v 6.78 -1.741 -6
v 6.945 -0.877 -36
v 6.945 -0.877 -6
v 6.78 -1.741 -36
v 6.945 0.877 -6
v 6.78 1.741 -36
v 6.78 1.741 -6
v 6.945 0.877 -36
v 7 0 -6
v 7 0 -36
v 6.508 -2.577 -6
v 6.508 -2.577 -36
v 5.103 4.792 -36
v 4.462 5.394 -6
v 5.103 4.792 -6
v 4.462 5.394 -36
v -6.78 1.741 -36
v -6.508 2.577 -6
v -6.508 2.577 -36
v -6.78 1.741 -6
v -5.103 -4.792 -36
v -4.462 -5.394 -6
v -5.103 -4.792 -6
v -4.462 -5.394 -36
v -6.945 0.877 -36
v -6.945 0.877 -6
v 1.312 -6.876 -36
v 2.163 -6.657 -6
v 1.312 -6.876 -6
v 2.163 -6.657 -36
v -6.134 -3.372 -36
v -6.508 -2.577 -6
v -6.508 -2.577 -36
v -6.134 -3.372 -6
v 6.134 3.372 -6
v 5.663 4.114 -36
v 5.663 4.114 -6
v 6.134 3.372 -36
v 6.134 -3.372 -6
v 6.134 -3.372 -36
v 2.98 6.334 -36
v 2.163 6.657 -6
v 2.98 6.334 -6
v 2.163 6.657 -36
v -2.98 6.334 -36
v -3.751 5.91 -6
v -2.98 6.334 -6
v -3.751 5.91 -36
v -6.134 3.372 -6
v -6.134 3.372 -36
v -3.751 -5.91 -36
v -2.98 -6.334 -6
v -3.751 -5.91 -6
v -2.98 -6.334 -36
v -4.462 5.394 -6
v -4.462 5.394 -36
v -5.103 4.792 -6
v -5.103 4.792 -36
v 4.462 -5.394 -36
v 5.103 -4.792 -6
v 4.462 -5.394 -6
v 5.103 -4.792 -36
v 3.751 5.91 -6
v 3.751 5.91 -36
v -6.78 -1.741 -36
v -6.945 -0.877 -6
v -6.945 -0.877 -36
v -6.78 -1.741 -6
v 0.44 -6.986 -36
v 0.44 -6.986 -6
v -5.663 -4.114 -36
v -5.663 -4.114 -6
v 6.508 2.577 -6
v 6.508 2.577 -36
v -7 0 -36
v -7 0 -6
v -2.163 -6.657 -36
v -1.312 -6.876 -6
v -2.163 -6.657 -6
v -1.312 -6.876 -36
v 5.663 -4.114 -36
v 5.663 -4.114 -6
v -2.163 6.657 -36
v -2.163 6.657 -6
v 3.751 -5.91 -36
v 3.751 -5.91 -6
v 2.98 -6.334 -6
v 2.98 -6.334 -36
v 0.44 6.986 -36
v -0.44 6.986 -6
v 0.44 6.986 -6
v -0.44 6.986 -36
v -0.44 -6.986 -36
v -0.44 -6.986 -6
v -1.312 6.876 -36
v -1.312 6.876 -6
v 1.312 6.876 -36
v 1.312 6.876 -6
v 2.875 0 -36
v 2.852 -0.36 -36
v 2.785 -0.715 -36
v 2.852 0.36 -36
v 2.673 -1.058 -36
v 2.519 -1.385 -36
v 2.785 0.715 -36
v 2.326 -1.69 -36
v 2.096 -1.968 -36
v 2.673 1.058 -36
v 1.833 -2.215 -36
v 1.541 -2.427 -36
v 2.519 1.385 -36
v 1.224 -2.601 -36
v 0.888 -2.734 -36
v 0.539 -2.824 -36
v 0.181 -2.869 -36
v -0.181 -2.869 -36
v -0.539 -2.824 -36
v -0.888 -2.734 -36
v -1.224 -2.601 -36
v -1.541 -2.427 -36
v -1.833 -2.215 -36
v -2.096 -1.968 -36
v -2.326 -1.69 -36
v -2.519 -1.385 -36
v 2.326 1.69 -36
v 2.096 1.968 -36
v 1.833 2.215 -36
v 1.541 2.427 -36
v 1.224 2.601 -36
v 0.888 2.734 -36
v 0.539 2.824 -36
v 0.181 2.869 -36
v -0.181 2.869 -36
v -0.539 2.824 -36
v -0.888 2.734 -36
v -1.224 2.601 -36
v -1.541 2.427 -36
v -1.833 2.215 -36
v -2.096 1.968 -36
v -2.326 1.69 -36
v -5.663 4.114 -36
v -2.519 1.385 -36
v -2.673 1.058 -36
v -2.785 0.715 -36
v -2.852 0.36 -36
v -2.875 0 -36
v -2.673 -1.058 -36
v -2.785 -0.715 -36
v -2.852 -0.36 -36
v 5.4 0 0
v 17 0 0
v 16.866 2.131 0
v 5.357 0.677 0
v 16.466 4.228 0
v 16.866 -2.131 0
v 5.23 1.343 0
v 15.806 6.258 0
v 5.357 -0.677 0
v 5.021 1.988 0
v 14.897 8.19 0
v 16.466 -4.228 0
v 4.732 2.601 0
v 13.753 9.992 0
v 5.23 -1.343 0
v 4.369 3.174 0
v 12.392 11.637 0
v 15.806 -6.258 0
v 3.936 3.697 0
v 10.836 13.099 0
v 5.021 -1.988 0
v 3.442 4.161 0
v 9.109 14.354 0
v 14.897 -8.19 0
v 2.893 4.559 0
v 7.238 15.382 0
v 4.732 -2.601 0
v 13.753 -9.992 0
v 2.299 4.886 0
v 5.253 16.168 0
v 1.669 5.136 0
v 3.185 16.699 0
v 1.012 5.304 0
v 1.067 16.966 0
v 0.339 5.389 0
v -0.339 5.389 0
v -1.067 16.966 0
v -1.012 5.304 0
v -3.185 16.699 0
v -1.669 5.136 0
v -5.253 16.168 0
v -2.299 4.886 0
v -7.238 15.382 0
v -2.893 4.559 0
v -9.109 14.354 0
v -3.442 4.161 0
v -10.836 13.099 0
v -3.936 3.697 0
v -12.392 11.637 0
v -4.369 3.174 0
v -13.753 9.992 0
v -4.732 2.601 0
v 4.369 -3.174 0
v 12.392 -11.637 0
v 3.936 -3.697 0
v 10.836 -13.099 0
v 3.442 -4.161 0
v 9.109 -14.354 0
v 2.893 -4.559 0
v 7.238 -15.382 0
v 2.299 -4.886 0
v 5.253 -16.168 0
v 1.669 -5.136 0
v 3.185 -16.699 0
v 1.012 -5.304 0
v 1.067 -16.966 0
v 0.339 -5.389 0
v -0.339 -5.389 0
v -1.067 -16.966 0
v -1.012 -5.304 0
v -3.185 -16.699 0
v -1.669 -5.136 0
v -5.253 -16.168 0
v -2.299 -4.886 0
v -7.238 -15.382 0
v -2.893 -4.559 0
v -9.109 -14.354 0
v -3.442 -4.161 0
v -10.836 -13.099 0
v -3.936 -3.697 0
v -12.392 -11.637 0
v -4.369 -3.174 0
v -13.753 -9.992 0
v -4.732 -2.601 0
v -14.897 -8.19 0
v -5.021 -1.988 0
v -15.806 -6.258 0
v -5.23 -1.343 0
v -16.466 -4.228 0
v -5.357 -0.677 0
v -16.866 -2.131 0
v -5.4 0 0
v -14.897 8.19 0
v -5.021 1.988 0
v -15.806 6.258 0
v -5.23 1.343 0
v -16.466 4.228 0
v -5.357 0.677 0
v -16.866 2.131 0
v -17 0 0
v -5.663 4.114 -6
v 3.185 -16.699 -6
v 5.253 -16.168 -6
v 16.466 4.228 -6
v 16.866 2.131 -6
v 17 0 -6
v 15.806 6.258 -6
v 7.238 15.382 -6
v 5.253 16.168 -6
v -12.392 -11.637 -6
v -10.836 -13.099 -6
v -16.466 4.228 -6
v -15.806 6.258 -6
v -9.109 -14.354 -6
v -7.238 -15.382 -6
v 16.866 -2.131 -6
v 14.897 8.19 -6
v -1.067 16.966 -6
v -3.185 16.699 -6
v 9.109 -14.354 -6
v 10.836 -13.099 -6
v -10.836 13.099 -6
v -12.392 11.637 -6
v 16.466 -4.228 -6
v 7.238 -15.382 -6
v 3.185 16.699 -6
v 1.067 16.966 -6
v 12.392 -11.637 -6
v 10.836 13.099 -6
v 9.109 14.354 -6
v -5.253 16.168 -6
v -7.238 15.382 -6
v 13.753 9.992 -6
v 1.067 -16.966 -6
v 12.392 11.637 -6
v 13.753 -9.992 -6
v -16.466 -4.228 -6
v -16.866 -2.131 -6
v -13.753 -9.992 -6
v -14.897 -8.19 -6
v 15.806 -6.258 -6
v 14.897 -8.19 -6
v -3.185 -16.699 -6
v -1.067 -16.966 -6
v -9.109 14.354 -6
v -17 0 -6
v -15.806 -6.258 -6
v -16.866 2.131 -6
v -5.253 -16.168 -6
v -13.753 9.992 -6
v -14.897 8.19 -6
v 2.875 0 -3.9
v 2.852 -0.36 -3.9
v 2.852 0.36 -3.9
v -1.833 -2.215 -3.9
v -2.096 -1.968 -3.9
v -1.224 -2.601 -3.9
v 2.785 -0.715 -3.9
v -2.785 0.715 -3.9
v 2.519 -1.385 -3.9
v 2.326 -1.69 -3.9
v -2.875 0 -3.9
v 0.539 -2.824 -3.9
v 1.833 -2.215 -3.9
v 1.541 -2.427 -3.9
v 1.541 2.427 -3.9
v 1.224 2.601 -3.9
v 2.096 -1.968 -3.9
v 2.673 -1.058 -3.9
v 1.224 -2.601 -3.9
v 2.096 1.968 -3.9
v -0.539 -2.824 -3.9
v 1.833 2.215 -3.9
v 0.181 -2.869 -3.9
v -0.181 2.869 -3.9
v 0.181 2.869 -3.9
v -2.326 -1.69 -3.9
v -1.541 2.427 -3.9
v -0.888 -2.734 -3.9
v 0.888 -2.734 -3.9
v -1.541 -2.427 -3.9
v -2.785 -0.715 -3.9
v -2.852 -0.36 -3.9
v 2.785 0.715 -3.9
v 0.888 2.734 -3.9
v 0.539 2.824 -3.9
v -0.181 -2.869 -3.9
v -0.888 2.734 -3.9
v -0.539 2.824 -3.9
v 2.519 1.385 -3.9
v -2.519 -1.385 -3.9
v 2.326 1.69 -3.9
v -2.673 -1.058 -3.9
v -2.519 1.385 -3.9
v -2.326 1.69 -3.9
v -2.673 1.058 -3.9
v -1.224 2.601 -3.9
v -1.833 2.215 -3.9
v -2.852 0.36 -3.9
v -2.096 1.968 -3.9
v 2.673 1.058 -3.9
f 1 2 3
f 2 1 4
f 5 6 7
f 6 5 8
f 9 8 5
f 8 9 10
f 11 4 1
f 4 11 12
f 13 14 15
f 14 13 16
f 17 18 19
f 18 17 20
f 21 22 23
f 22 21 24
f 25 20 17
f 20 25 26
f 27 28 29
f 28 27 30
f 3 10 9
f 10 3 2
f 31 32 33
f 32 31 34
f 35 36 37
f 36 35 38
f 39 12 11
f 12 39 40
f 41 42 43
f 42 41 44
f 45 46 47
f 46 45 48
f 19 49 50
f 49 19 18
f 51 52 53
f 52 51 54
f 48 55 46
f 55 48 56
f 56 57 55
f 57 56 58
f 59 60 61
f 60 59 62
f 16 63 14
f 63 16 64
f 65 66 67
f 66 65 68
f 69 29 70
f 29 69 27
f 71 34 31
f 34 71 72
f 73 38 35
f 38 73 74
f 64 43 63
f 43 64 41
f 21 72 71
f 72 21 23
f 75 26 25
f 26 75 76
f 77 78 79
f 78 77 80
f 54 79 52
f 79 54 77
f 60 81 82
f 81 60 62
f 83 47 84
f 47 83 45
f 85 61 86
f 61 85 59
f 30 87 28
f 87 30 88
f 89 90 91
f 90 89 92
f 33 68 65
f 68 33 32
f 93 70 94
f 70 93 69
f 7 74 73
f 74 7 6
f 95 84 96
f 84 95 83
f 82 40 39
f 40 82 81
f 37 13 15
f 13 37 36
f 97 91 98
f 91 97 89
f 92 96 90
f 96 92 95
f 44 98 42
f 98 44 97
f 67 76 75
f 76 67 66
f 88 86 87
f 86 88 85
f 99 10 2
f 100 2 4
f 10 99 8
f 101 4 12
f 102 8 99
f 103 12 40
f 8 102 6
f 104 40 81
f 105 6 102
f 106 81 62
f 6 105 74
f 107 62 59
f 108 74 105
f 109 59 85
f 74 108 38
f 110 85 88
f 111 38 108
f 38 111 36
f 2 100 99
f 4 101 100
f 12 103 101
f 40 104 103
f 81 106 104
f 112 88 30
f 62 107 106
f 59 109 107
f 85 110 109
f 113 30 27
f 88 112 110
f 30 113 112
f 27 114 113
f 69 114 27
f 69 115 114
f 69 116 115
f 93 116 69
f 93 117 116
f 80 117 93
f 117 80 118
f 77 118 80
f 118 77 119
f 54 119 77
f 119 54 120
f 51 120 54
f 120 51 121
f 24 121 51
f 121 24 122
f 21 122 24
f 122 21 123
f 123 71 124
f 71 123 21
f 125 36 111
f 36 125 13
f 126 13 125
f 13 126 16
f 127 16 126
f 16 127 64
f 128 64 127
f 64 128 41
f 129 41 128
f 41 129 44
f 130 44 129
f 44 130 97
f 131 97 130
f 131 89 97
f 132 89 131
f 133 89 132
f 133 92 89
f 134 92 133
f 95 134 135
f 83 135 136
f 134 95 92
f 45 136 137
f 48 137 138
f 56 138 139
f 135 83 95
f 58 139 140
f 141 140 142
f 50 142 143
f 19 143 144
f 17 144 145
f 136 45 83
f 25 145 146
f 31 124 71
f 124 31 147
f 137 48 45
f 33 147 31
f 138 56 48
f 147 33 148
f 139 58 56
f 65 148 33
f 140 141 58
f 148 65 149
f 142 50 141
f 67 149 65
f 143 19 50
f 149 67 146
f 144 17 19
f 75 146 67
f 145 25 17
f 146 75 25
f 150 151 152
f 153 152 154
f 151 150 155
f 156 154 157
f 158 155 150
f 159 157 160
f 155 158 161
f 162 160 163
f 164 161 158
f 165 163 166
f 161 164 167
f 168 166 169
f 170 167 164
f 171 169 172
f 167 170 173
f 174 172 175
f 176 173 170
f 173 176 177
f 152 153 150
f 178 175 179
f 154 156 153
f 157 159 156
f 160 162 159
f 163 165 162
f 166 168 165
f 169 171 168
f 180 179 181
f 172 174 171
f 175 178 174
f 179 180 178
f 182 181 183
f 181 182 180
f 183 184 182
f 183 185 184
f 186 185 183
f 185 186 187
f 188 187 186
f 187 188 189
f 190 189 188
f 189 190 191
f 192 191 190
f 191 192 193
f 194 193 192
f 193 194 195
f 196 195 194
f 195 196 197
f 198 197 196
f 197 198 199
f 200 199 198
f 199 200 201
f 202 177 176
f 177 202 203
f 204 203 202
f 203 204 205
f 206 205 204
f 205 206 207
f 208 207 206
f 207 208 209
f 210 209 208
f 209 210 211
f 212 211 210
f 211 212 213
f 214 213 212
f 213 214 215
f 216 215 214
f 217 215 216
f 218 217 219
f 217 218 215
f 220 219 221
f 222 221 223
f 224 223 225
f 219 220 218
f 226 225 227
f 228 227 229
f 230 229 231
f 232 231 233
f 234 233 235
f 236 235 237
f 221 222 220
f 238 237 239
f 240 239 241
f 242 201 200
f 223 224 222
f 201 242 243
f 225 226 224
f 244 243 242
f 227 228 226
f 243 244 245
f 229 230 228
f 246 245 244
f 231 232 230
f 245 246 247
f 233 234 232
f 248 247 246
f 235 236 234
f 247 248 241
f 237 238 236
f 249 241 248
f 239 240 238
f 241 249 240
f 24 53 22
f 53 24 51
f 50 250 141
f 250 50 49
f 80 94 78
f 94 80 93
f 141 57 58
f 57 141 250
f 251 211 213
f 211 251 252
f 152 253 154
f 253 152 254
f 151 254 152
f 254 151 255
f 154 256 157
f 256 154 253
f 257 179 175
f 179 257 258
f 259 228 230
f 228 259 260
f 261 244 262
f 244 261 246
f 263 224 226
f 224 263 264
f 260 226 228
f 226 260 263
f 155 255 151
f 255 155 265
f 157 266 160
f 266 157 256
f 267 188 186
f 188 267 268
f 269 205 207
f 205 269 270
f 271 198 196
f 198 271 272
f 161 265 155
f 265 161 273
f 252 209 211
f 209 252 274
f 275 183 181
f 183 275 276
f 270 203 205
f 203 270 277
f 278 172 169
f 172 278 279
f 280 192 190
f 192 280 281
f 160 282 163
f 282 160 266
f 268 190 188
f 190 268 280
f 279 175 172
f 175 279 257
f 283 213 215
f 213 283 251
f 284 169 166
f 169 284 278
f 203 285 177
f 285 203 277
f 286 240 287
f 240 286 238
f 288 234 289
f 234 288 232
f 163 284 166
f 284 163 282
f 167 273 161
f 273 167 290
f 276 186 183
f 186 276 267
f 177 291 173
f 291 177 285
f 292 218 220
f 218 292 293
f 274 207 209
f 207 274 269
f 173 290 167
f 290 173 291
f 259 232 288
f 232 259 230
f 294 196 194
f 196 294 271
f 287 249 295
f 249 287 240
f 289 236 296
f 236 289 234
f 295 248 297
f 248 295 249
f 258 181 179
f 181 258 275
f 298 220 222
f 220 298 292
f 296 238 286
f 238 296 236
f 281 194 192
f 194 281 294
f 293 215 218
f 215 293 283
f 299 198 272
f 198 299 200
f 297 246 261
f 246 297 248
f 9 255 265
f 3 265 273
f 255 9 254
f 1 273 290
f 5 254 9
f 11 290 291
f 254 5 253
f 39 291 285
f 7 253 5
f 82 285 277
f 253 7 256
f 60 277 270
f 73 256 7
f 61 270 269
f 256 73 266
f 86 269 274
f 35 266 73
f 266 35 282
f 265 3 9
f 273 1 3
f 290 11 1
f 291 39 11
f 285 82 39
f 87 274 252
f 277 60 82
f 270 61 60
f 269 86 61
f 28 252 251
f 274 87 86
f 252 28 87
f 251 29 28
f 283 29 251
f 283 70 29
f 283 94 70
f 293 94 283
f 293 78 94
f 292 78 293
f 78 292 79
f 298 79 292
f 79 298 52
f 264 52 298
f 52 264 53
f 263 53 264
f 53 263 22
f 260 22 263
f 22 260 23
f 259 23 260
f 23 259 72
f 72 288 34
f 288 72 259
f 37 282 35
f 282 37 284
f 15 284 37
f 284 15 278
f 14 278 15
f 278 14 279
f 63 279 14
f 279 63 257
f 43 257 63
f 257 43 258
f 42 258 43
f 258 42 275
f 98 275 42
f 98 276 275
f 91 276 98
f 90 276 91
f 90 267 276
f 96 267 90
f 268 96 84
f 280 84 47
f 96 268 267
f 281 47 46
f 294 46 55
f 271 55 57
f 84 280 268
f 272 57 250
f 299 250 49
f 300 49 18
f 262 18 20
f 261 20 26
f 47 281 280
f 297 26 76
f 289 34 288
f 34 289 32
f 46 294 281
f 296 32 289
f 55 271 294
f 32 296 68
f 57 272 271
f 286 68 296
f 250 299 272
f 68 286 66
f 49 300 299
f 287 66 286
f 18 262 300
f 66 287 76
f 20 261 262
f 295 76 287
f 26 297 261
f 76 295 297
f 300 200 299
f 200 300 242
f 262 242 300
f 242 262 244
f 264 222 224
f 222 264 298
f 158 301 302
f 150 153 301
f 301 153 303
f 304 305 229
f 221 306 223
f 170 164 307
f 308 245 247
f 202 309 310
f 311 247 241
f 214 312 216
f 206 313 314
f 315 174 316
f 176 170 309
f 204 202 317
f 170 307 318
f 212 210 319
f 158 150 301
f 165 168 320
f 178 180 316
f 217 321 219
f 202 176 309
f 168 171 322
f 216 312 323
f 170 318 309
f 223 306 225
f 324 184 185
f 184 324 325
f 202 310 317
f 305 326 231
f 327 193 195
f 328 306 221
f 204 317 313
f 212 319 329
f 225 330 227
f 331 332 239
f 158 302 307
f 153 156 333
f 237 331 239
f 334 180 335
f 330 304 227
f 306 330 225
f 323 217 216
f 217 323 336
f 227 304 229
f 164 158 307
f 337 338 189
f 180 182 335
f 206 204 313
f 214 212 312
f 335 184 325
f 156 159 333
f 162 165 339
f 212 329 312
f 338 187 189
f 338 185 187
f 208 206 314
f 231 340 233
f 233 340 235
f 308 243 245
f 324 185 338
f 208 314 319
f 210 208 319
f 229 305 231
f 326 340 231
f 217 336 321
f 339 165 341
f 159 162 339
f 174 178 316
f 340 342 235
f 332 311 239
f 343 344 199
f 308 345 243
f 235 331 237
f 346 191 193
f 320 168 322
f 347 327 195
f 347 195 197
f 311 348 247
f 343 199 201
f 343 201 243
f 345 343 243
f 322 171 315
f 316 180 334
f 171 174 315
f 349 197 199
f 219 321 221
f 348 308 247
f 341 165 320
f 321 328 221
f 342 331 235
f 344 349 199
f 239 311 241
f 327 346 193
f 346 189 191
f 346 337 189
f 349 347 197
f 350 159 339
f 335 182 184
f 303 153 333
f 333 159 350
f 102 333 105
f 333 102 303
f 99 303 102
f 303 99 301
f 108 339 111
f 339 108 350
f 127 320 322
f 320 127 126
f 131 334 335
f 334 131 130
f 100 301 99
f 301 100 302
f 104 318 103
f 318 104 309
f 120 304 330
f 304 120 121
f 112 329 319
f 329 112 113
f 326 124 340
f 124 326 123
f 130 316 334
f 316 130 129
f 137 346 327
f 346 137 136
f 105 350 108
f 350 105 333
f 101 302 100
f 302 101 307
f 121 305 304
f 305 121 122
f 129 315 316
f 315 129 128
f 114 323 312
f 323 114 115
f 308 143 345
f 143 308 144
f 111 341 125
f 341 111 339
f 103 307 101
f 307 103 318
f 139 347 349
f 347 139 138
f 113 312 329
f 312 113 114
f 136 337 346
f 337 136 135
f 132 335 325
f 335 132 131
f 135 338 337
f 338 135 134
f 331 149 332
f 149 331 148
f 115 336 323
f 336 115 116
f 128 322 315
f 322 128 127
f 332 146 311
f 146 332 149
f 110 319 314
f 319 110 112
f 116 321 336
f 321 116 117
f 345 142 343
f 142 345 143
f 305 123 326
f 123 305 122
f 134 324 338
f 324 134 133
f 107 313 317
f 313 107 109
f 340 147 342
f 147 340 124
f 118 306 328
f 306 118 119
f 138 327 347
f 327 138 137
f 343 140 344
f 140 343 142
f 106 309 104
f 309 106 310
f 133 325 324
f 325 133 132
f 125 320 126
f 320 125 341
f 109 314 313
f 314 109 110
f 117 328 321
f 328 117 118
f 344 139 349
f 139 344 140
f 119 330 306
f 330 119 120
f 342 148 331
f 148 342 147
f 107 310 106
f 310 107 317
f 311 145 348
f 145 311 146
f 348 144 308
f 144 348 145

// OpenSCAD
$fn = 50;


difference() {
	union() {
		translate(v = [0, 0, -36.0000000000]) {
			cylinder(h = 36, r = 7.0000000000);
		}
		translate(v = [0, 0, -6.0000000000]) {
			cylinder(h = 6, r = 17.0000000000);
		}
	}
	union() {
		translate(v = [0, 0, 0]) {
			rotate(a = [0, 0, 0]) {
				difference() {
					union() {
						#translate(v = [0, 0, -36.0000000000]) {
							cylinder(h = 36, r = 2.6000000000);
						}
						#translate(v = [0, 0, -3.9000000000]) {
							cylinder(h = 3.9000000000, r1 = 2.8750000000, r2 = 5.4000000000);
						}
						#translate(v = [0, 0, -36.0000000000]) {
							cylinder(h = 36, r = 2.8750000000);
						}
						#translate(v = [0, 0, -36.0000000000]) {
							cylinder(h = 36, r = 2.6000000000);
						}
					}
					union();
				}
			}
		}
	}
}
